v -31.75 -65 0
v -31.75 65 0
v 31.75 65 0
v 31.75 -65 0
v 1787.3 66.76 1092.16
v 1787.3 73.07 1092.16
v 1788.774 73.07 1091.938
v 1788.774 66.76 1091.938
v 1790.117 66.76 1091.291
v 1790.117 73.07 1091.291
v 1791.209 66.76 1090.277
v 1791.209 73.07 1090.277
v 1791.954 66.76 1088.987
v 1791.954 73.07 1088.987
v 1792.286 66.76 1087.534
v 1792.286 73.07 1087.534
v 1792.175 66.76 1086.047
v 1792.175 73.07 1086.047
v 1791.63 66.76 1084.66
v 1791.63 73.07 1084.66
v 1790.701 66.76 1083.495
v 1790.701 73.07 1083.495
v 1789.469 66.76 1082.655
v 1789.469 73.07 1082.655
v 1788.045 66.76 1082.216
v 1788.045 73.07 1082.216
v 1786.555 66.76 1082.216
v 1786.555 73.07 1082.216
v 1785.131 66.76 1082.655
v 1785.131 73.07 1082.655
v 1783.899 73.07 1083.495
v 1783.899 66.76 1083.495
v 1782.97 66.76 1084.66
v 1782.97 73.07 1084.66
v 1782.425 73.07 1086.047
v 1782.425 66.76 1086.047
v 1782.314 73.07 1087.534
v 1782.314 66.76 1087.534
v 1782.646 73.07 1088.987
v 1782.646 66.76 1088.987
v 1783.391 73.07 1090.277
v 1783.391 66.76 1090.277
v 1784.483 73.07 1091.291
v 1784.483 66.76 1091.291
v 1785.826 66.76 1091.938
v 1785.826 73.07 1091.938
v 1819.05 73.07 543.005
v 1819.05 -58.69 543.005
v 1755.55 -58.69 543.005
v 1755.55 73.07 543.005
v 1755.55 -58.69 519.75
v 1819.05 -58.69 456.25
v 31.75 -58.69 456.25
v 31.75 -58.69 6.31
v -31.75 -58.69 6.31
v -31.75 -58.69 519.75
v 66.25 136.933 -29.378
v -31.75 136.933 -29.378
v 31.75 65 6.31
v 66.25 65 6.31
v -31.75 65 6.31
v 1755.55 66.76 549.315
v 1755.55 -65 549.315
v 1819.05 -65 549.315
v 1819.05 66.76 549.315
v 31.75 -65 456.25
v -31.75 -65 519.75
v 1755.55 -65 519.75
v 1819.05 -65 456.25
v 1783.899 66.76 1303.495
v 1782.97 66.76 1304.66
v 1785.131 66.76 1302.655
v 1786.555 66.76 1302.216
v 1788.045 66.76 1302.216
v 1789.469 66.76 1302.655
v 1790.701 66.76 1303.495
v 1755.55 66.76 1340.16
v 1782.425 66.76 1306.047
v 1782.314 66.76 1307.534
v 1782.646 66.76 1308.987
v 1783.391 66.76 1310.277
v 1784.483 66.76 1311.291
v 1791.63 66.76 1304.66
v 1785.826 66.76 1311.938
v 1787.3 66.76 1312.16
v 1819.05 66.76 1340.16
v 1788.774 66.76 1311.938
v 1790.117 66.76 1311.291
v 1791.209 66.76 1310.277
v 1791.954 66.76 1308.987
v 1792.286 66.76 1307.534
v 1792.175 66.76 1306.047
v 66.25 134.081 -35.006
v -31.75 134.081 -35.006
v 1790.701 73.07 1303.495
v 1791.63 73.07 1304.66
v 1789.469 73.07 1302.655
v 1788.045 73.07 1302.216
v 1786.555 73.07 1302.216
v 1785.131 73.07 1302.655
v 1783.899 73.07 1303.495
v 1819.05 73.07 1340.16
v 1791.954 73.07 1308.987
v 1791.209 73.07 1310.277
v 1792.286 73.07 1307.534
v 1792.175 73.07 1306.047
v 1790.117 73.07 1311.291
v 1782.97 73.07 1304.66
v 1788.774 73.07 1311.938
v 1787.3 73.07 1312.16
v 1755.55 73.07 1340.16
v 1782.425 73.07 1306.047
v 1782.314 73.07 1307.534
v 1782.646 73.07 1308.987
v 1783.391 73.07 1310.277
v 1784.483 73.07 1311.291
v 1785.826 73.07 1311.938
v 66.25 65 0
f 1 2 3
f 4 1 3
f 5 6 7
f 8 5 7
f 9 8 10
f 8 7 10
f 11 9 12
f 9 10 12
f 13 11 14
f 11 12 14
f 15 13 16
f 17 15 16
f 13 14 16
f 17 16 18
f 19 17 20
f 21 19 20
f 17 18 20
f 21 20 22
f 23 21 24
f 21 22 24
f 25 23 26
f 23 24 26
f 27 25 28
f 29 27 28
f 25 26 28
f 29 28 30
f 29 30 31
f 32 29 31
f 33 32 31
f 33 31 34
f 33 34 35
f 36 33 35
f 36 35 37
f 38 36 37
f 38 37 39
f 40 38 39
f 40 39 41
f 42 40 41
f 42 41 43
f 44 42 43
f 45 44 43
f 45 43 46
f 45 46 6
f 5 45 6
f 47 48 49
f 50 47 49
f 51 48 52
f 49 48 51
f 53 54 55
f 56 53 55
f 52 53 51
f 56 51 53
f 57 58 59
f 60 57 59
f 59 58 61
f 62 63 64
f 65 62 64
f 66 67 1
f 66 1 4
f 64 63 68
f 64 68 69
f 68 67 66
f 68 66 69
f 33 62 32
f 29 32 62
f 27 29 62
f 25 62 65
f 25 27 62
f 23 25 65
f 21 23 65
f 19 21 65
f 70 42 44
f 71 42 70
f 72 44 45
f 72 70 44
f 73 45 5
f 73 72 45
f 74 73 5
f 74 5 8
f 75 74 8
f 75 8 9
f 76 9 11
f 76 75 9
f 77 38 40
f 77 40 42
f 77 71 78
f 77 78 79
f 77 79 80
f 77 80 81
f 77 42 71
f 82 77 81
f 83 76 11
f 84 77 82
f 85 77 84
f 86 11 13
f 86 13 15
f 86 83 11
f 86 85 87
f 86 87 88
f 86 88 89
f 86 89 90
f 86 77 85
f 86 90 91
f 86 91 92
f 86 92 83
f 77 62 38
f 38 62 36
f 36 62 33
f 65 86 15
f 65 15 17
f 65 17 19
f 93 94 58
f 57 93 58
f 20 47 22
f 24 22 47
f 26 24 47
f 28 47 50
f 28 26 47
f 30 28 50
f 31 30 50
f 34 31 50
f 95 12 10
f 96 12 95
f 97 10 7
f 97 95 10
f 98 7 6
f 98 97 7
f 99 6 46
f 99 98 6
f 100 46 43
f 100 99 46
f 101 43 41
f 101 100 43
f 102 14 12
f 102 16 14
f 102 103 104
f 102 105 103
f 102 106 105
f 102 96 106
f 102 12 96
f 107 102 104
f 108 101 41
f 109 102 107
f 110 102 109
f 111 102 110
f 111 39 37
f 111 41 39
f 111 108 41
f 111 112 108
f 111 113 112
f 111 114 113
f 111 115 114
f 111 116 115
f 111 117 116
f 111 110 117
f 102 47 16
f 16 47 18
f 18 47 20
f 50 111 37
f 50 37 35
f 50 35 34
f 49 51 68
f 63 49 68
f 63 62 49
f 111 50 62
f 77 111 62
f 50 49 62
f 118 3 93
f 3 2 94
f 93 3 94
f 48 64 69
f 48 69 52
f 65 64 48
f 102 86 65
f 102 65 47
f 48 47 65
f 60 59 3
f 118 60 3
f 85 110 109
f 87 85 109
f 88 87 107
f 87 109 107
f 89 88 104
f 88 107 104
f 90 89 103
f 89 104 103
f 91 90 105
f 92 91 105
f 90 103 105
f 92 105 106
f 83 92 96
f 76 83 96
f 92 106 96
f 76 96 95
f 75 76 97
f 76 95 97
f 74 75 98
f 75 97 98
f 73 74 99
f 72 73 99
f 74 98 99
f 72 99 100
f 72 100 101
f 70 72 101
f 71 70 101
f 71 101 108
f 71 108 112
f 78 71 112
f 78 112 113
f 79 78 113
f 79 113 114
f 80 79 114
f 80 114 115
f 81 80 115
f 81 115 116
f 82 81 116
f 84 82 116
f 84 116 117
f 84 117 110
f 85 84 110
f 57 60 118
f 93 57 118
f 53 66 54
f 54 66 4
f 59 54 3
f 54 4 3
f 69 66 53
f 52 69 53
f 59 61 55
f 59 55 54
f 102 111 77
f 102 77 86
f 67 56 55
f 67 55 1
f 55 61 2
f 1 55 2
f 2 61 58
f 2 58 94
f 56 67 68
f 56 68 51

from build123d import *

# Parameters (mm, degrees)
CROQUIS2_W              = 63.5
CROQUIS2_H              = 130
SALIENTE_EXTRUIR1_DEPTH = 6.31
CROQUIS3_W              = 63.5
CROQUIS3_H              = 6.31
SALIENTE_EXTRUIR2_DEPTH = 513.44
CROQUIS4_W              = 63.5
CROQUIS4_H              = 6.31
SALIENTE_EXTRUIR3_DEPTH = 1787.3
CROQUIS9_W              = 63.5
CROQUIS9_H              = 6.31
SALIENTE_EXTRUIR4_DEPTH = 98
CROQUIS12_R             = 5
CORTAR_EXTRUIR1_DEPTH   = 10


with BuildPart() as part:
    # Croquis2 → Saliente-Extruir1 (new body)
    with BuildSketch(Plane.XY):
        Rectangle(CROQUIS2_W, CROQUIS2_H)
    extrude(amount=SALIENTE_EXTRUIR1_DEPTH)

    # Croquis3 → Saliente-Extruir2 (add)
    with BuildSketch(Plane.XY.offset(6.31)):
        with Locations((0, -61.845)):
            Rectangle(CROQUIS3_W, CROQUIS3_H)
    extrude(amount=SALIENTE_EXTRUIR2_DEPTH)

    # Croquis4 → Saliente-Extruir3 (add)
    with BuildSketch(Plane(origin=(31.75, 0, 0), x_dir=(0, 0, -1), z_dir=(1, 0, 0))):
        with Locations((-488, -61.845)):
            Rectangle(CROQUIS4_W, CROQUIS4_H)
    extrude(amount=SALIENTE_EXTRUIR3_DEPTH)

    # Barrer2: sweep along a curve in space
    with BuildLine() as barrer2_path:
        Line((1787.3, -61.845, 519.75), (1787.3, -61.845, 546.16))
        Line((1787.3, -61.845, 546.16), (1787.3, 69.915, 546.16))
        Line((1787.3, 69.915, 546.16), (1787.3, 69.915, 1340.16))
    # Croquis9 → Barrer2 (sweep)
    with BuildSketch(Plane.XY.offset(519.75)):
        with Locations((1787.3, -61.845)):
            Rectangle(CROQUIS9_W, CROQUIS9_H)
    sweep(path=barrer2_path.line, transition=Transition.RIGHT)

    # Croquis11 → Saliente-Extruir4 (add)
    with BuildSketch(Plane.ZY.offset(31.75)):
        Polygon((0, 65), (-35.006192049, 134.080780284), (-29.377619212, 136.933019371), (6.31, 65), align=None)
    extrude(amount=-SALIENTE_EXTRUIR4_DEPTH)

    # Croquis12 → Cortar-Extruir1 (cut)
    with BuildSketch(Plane(origin=(0, 73.07, 0), x_dir=(1, 0, 0), z_dir=(0, 1, 0))):
        with Locations(Location((1787.3, -1307.16, 0), (0, 0, 270))):
            Circle(CROQUIS12_R)
        with Locations(Location((1787.3, -1087.16, 0), (0, 0, 270))):
            Circle(CROQUIS12_R)
    extrude(amount=-CORTAR_EXTRUIR1_DEPTH, mode=Mode.SUBTRACT)


solid = part.part
